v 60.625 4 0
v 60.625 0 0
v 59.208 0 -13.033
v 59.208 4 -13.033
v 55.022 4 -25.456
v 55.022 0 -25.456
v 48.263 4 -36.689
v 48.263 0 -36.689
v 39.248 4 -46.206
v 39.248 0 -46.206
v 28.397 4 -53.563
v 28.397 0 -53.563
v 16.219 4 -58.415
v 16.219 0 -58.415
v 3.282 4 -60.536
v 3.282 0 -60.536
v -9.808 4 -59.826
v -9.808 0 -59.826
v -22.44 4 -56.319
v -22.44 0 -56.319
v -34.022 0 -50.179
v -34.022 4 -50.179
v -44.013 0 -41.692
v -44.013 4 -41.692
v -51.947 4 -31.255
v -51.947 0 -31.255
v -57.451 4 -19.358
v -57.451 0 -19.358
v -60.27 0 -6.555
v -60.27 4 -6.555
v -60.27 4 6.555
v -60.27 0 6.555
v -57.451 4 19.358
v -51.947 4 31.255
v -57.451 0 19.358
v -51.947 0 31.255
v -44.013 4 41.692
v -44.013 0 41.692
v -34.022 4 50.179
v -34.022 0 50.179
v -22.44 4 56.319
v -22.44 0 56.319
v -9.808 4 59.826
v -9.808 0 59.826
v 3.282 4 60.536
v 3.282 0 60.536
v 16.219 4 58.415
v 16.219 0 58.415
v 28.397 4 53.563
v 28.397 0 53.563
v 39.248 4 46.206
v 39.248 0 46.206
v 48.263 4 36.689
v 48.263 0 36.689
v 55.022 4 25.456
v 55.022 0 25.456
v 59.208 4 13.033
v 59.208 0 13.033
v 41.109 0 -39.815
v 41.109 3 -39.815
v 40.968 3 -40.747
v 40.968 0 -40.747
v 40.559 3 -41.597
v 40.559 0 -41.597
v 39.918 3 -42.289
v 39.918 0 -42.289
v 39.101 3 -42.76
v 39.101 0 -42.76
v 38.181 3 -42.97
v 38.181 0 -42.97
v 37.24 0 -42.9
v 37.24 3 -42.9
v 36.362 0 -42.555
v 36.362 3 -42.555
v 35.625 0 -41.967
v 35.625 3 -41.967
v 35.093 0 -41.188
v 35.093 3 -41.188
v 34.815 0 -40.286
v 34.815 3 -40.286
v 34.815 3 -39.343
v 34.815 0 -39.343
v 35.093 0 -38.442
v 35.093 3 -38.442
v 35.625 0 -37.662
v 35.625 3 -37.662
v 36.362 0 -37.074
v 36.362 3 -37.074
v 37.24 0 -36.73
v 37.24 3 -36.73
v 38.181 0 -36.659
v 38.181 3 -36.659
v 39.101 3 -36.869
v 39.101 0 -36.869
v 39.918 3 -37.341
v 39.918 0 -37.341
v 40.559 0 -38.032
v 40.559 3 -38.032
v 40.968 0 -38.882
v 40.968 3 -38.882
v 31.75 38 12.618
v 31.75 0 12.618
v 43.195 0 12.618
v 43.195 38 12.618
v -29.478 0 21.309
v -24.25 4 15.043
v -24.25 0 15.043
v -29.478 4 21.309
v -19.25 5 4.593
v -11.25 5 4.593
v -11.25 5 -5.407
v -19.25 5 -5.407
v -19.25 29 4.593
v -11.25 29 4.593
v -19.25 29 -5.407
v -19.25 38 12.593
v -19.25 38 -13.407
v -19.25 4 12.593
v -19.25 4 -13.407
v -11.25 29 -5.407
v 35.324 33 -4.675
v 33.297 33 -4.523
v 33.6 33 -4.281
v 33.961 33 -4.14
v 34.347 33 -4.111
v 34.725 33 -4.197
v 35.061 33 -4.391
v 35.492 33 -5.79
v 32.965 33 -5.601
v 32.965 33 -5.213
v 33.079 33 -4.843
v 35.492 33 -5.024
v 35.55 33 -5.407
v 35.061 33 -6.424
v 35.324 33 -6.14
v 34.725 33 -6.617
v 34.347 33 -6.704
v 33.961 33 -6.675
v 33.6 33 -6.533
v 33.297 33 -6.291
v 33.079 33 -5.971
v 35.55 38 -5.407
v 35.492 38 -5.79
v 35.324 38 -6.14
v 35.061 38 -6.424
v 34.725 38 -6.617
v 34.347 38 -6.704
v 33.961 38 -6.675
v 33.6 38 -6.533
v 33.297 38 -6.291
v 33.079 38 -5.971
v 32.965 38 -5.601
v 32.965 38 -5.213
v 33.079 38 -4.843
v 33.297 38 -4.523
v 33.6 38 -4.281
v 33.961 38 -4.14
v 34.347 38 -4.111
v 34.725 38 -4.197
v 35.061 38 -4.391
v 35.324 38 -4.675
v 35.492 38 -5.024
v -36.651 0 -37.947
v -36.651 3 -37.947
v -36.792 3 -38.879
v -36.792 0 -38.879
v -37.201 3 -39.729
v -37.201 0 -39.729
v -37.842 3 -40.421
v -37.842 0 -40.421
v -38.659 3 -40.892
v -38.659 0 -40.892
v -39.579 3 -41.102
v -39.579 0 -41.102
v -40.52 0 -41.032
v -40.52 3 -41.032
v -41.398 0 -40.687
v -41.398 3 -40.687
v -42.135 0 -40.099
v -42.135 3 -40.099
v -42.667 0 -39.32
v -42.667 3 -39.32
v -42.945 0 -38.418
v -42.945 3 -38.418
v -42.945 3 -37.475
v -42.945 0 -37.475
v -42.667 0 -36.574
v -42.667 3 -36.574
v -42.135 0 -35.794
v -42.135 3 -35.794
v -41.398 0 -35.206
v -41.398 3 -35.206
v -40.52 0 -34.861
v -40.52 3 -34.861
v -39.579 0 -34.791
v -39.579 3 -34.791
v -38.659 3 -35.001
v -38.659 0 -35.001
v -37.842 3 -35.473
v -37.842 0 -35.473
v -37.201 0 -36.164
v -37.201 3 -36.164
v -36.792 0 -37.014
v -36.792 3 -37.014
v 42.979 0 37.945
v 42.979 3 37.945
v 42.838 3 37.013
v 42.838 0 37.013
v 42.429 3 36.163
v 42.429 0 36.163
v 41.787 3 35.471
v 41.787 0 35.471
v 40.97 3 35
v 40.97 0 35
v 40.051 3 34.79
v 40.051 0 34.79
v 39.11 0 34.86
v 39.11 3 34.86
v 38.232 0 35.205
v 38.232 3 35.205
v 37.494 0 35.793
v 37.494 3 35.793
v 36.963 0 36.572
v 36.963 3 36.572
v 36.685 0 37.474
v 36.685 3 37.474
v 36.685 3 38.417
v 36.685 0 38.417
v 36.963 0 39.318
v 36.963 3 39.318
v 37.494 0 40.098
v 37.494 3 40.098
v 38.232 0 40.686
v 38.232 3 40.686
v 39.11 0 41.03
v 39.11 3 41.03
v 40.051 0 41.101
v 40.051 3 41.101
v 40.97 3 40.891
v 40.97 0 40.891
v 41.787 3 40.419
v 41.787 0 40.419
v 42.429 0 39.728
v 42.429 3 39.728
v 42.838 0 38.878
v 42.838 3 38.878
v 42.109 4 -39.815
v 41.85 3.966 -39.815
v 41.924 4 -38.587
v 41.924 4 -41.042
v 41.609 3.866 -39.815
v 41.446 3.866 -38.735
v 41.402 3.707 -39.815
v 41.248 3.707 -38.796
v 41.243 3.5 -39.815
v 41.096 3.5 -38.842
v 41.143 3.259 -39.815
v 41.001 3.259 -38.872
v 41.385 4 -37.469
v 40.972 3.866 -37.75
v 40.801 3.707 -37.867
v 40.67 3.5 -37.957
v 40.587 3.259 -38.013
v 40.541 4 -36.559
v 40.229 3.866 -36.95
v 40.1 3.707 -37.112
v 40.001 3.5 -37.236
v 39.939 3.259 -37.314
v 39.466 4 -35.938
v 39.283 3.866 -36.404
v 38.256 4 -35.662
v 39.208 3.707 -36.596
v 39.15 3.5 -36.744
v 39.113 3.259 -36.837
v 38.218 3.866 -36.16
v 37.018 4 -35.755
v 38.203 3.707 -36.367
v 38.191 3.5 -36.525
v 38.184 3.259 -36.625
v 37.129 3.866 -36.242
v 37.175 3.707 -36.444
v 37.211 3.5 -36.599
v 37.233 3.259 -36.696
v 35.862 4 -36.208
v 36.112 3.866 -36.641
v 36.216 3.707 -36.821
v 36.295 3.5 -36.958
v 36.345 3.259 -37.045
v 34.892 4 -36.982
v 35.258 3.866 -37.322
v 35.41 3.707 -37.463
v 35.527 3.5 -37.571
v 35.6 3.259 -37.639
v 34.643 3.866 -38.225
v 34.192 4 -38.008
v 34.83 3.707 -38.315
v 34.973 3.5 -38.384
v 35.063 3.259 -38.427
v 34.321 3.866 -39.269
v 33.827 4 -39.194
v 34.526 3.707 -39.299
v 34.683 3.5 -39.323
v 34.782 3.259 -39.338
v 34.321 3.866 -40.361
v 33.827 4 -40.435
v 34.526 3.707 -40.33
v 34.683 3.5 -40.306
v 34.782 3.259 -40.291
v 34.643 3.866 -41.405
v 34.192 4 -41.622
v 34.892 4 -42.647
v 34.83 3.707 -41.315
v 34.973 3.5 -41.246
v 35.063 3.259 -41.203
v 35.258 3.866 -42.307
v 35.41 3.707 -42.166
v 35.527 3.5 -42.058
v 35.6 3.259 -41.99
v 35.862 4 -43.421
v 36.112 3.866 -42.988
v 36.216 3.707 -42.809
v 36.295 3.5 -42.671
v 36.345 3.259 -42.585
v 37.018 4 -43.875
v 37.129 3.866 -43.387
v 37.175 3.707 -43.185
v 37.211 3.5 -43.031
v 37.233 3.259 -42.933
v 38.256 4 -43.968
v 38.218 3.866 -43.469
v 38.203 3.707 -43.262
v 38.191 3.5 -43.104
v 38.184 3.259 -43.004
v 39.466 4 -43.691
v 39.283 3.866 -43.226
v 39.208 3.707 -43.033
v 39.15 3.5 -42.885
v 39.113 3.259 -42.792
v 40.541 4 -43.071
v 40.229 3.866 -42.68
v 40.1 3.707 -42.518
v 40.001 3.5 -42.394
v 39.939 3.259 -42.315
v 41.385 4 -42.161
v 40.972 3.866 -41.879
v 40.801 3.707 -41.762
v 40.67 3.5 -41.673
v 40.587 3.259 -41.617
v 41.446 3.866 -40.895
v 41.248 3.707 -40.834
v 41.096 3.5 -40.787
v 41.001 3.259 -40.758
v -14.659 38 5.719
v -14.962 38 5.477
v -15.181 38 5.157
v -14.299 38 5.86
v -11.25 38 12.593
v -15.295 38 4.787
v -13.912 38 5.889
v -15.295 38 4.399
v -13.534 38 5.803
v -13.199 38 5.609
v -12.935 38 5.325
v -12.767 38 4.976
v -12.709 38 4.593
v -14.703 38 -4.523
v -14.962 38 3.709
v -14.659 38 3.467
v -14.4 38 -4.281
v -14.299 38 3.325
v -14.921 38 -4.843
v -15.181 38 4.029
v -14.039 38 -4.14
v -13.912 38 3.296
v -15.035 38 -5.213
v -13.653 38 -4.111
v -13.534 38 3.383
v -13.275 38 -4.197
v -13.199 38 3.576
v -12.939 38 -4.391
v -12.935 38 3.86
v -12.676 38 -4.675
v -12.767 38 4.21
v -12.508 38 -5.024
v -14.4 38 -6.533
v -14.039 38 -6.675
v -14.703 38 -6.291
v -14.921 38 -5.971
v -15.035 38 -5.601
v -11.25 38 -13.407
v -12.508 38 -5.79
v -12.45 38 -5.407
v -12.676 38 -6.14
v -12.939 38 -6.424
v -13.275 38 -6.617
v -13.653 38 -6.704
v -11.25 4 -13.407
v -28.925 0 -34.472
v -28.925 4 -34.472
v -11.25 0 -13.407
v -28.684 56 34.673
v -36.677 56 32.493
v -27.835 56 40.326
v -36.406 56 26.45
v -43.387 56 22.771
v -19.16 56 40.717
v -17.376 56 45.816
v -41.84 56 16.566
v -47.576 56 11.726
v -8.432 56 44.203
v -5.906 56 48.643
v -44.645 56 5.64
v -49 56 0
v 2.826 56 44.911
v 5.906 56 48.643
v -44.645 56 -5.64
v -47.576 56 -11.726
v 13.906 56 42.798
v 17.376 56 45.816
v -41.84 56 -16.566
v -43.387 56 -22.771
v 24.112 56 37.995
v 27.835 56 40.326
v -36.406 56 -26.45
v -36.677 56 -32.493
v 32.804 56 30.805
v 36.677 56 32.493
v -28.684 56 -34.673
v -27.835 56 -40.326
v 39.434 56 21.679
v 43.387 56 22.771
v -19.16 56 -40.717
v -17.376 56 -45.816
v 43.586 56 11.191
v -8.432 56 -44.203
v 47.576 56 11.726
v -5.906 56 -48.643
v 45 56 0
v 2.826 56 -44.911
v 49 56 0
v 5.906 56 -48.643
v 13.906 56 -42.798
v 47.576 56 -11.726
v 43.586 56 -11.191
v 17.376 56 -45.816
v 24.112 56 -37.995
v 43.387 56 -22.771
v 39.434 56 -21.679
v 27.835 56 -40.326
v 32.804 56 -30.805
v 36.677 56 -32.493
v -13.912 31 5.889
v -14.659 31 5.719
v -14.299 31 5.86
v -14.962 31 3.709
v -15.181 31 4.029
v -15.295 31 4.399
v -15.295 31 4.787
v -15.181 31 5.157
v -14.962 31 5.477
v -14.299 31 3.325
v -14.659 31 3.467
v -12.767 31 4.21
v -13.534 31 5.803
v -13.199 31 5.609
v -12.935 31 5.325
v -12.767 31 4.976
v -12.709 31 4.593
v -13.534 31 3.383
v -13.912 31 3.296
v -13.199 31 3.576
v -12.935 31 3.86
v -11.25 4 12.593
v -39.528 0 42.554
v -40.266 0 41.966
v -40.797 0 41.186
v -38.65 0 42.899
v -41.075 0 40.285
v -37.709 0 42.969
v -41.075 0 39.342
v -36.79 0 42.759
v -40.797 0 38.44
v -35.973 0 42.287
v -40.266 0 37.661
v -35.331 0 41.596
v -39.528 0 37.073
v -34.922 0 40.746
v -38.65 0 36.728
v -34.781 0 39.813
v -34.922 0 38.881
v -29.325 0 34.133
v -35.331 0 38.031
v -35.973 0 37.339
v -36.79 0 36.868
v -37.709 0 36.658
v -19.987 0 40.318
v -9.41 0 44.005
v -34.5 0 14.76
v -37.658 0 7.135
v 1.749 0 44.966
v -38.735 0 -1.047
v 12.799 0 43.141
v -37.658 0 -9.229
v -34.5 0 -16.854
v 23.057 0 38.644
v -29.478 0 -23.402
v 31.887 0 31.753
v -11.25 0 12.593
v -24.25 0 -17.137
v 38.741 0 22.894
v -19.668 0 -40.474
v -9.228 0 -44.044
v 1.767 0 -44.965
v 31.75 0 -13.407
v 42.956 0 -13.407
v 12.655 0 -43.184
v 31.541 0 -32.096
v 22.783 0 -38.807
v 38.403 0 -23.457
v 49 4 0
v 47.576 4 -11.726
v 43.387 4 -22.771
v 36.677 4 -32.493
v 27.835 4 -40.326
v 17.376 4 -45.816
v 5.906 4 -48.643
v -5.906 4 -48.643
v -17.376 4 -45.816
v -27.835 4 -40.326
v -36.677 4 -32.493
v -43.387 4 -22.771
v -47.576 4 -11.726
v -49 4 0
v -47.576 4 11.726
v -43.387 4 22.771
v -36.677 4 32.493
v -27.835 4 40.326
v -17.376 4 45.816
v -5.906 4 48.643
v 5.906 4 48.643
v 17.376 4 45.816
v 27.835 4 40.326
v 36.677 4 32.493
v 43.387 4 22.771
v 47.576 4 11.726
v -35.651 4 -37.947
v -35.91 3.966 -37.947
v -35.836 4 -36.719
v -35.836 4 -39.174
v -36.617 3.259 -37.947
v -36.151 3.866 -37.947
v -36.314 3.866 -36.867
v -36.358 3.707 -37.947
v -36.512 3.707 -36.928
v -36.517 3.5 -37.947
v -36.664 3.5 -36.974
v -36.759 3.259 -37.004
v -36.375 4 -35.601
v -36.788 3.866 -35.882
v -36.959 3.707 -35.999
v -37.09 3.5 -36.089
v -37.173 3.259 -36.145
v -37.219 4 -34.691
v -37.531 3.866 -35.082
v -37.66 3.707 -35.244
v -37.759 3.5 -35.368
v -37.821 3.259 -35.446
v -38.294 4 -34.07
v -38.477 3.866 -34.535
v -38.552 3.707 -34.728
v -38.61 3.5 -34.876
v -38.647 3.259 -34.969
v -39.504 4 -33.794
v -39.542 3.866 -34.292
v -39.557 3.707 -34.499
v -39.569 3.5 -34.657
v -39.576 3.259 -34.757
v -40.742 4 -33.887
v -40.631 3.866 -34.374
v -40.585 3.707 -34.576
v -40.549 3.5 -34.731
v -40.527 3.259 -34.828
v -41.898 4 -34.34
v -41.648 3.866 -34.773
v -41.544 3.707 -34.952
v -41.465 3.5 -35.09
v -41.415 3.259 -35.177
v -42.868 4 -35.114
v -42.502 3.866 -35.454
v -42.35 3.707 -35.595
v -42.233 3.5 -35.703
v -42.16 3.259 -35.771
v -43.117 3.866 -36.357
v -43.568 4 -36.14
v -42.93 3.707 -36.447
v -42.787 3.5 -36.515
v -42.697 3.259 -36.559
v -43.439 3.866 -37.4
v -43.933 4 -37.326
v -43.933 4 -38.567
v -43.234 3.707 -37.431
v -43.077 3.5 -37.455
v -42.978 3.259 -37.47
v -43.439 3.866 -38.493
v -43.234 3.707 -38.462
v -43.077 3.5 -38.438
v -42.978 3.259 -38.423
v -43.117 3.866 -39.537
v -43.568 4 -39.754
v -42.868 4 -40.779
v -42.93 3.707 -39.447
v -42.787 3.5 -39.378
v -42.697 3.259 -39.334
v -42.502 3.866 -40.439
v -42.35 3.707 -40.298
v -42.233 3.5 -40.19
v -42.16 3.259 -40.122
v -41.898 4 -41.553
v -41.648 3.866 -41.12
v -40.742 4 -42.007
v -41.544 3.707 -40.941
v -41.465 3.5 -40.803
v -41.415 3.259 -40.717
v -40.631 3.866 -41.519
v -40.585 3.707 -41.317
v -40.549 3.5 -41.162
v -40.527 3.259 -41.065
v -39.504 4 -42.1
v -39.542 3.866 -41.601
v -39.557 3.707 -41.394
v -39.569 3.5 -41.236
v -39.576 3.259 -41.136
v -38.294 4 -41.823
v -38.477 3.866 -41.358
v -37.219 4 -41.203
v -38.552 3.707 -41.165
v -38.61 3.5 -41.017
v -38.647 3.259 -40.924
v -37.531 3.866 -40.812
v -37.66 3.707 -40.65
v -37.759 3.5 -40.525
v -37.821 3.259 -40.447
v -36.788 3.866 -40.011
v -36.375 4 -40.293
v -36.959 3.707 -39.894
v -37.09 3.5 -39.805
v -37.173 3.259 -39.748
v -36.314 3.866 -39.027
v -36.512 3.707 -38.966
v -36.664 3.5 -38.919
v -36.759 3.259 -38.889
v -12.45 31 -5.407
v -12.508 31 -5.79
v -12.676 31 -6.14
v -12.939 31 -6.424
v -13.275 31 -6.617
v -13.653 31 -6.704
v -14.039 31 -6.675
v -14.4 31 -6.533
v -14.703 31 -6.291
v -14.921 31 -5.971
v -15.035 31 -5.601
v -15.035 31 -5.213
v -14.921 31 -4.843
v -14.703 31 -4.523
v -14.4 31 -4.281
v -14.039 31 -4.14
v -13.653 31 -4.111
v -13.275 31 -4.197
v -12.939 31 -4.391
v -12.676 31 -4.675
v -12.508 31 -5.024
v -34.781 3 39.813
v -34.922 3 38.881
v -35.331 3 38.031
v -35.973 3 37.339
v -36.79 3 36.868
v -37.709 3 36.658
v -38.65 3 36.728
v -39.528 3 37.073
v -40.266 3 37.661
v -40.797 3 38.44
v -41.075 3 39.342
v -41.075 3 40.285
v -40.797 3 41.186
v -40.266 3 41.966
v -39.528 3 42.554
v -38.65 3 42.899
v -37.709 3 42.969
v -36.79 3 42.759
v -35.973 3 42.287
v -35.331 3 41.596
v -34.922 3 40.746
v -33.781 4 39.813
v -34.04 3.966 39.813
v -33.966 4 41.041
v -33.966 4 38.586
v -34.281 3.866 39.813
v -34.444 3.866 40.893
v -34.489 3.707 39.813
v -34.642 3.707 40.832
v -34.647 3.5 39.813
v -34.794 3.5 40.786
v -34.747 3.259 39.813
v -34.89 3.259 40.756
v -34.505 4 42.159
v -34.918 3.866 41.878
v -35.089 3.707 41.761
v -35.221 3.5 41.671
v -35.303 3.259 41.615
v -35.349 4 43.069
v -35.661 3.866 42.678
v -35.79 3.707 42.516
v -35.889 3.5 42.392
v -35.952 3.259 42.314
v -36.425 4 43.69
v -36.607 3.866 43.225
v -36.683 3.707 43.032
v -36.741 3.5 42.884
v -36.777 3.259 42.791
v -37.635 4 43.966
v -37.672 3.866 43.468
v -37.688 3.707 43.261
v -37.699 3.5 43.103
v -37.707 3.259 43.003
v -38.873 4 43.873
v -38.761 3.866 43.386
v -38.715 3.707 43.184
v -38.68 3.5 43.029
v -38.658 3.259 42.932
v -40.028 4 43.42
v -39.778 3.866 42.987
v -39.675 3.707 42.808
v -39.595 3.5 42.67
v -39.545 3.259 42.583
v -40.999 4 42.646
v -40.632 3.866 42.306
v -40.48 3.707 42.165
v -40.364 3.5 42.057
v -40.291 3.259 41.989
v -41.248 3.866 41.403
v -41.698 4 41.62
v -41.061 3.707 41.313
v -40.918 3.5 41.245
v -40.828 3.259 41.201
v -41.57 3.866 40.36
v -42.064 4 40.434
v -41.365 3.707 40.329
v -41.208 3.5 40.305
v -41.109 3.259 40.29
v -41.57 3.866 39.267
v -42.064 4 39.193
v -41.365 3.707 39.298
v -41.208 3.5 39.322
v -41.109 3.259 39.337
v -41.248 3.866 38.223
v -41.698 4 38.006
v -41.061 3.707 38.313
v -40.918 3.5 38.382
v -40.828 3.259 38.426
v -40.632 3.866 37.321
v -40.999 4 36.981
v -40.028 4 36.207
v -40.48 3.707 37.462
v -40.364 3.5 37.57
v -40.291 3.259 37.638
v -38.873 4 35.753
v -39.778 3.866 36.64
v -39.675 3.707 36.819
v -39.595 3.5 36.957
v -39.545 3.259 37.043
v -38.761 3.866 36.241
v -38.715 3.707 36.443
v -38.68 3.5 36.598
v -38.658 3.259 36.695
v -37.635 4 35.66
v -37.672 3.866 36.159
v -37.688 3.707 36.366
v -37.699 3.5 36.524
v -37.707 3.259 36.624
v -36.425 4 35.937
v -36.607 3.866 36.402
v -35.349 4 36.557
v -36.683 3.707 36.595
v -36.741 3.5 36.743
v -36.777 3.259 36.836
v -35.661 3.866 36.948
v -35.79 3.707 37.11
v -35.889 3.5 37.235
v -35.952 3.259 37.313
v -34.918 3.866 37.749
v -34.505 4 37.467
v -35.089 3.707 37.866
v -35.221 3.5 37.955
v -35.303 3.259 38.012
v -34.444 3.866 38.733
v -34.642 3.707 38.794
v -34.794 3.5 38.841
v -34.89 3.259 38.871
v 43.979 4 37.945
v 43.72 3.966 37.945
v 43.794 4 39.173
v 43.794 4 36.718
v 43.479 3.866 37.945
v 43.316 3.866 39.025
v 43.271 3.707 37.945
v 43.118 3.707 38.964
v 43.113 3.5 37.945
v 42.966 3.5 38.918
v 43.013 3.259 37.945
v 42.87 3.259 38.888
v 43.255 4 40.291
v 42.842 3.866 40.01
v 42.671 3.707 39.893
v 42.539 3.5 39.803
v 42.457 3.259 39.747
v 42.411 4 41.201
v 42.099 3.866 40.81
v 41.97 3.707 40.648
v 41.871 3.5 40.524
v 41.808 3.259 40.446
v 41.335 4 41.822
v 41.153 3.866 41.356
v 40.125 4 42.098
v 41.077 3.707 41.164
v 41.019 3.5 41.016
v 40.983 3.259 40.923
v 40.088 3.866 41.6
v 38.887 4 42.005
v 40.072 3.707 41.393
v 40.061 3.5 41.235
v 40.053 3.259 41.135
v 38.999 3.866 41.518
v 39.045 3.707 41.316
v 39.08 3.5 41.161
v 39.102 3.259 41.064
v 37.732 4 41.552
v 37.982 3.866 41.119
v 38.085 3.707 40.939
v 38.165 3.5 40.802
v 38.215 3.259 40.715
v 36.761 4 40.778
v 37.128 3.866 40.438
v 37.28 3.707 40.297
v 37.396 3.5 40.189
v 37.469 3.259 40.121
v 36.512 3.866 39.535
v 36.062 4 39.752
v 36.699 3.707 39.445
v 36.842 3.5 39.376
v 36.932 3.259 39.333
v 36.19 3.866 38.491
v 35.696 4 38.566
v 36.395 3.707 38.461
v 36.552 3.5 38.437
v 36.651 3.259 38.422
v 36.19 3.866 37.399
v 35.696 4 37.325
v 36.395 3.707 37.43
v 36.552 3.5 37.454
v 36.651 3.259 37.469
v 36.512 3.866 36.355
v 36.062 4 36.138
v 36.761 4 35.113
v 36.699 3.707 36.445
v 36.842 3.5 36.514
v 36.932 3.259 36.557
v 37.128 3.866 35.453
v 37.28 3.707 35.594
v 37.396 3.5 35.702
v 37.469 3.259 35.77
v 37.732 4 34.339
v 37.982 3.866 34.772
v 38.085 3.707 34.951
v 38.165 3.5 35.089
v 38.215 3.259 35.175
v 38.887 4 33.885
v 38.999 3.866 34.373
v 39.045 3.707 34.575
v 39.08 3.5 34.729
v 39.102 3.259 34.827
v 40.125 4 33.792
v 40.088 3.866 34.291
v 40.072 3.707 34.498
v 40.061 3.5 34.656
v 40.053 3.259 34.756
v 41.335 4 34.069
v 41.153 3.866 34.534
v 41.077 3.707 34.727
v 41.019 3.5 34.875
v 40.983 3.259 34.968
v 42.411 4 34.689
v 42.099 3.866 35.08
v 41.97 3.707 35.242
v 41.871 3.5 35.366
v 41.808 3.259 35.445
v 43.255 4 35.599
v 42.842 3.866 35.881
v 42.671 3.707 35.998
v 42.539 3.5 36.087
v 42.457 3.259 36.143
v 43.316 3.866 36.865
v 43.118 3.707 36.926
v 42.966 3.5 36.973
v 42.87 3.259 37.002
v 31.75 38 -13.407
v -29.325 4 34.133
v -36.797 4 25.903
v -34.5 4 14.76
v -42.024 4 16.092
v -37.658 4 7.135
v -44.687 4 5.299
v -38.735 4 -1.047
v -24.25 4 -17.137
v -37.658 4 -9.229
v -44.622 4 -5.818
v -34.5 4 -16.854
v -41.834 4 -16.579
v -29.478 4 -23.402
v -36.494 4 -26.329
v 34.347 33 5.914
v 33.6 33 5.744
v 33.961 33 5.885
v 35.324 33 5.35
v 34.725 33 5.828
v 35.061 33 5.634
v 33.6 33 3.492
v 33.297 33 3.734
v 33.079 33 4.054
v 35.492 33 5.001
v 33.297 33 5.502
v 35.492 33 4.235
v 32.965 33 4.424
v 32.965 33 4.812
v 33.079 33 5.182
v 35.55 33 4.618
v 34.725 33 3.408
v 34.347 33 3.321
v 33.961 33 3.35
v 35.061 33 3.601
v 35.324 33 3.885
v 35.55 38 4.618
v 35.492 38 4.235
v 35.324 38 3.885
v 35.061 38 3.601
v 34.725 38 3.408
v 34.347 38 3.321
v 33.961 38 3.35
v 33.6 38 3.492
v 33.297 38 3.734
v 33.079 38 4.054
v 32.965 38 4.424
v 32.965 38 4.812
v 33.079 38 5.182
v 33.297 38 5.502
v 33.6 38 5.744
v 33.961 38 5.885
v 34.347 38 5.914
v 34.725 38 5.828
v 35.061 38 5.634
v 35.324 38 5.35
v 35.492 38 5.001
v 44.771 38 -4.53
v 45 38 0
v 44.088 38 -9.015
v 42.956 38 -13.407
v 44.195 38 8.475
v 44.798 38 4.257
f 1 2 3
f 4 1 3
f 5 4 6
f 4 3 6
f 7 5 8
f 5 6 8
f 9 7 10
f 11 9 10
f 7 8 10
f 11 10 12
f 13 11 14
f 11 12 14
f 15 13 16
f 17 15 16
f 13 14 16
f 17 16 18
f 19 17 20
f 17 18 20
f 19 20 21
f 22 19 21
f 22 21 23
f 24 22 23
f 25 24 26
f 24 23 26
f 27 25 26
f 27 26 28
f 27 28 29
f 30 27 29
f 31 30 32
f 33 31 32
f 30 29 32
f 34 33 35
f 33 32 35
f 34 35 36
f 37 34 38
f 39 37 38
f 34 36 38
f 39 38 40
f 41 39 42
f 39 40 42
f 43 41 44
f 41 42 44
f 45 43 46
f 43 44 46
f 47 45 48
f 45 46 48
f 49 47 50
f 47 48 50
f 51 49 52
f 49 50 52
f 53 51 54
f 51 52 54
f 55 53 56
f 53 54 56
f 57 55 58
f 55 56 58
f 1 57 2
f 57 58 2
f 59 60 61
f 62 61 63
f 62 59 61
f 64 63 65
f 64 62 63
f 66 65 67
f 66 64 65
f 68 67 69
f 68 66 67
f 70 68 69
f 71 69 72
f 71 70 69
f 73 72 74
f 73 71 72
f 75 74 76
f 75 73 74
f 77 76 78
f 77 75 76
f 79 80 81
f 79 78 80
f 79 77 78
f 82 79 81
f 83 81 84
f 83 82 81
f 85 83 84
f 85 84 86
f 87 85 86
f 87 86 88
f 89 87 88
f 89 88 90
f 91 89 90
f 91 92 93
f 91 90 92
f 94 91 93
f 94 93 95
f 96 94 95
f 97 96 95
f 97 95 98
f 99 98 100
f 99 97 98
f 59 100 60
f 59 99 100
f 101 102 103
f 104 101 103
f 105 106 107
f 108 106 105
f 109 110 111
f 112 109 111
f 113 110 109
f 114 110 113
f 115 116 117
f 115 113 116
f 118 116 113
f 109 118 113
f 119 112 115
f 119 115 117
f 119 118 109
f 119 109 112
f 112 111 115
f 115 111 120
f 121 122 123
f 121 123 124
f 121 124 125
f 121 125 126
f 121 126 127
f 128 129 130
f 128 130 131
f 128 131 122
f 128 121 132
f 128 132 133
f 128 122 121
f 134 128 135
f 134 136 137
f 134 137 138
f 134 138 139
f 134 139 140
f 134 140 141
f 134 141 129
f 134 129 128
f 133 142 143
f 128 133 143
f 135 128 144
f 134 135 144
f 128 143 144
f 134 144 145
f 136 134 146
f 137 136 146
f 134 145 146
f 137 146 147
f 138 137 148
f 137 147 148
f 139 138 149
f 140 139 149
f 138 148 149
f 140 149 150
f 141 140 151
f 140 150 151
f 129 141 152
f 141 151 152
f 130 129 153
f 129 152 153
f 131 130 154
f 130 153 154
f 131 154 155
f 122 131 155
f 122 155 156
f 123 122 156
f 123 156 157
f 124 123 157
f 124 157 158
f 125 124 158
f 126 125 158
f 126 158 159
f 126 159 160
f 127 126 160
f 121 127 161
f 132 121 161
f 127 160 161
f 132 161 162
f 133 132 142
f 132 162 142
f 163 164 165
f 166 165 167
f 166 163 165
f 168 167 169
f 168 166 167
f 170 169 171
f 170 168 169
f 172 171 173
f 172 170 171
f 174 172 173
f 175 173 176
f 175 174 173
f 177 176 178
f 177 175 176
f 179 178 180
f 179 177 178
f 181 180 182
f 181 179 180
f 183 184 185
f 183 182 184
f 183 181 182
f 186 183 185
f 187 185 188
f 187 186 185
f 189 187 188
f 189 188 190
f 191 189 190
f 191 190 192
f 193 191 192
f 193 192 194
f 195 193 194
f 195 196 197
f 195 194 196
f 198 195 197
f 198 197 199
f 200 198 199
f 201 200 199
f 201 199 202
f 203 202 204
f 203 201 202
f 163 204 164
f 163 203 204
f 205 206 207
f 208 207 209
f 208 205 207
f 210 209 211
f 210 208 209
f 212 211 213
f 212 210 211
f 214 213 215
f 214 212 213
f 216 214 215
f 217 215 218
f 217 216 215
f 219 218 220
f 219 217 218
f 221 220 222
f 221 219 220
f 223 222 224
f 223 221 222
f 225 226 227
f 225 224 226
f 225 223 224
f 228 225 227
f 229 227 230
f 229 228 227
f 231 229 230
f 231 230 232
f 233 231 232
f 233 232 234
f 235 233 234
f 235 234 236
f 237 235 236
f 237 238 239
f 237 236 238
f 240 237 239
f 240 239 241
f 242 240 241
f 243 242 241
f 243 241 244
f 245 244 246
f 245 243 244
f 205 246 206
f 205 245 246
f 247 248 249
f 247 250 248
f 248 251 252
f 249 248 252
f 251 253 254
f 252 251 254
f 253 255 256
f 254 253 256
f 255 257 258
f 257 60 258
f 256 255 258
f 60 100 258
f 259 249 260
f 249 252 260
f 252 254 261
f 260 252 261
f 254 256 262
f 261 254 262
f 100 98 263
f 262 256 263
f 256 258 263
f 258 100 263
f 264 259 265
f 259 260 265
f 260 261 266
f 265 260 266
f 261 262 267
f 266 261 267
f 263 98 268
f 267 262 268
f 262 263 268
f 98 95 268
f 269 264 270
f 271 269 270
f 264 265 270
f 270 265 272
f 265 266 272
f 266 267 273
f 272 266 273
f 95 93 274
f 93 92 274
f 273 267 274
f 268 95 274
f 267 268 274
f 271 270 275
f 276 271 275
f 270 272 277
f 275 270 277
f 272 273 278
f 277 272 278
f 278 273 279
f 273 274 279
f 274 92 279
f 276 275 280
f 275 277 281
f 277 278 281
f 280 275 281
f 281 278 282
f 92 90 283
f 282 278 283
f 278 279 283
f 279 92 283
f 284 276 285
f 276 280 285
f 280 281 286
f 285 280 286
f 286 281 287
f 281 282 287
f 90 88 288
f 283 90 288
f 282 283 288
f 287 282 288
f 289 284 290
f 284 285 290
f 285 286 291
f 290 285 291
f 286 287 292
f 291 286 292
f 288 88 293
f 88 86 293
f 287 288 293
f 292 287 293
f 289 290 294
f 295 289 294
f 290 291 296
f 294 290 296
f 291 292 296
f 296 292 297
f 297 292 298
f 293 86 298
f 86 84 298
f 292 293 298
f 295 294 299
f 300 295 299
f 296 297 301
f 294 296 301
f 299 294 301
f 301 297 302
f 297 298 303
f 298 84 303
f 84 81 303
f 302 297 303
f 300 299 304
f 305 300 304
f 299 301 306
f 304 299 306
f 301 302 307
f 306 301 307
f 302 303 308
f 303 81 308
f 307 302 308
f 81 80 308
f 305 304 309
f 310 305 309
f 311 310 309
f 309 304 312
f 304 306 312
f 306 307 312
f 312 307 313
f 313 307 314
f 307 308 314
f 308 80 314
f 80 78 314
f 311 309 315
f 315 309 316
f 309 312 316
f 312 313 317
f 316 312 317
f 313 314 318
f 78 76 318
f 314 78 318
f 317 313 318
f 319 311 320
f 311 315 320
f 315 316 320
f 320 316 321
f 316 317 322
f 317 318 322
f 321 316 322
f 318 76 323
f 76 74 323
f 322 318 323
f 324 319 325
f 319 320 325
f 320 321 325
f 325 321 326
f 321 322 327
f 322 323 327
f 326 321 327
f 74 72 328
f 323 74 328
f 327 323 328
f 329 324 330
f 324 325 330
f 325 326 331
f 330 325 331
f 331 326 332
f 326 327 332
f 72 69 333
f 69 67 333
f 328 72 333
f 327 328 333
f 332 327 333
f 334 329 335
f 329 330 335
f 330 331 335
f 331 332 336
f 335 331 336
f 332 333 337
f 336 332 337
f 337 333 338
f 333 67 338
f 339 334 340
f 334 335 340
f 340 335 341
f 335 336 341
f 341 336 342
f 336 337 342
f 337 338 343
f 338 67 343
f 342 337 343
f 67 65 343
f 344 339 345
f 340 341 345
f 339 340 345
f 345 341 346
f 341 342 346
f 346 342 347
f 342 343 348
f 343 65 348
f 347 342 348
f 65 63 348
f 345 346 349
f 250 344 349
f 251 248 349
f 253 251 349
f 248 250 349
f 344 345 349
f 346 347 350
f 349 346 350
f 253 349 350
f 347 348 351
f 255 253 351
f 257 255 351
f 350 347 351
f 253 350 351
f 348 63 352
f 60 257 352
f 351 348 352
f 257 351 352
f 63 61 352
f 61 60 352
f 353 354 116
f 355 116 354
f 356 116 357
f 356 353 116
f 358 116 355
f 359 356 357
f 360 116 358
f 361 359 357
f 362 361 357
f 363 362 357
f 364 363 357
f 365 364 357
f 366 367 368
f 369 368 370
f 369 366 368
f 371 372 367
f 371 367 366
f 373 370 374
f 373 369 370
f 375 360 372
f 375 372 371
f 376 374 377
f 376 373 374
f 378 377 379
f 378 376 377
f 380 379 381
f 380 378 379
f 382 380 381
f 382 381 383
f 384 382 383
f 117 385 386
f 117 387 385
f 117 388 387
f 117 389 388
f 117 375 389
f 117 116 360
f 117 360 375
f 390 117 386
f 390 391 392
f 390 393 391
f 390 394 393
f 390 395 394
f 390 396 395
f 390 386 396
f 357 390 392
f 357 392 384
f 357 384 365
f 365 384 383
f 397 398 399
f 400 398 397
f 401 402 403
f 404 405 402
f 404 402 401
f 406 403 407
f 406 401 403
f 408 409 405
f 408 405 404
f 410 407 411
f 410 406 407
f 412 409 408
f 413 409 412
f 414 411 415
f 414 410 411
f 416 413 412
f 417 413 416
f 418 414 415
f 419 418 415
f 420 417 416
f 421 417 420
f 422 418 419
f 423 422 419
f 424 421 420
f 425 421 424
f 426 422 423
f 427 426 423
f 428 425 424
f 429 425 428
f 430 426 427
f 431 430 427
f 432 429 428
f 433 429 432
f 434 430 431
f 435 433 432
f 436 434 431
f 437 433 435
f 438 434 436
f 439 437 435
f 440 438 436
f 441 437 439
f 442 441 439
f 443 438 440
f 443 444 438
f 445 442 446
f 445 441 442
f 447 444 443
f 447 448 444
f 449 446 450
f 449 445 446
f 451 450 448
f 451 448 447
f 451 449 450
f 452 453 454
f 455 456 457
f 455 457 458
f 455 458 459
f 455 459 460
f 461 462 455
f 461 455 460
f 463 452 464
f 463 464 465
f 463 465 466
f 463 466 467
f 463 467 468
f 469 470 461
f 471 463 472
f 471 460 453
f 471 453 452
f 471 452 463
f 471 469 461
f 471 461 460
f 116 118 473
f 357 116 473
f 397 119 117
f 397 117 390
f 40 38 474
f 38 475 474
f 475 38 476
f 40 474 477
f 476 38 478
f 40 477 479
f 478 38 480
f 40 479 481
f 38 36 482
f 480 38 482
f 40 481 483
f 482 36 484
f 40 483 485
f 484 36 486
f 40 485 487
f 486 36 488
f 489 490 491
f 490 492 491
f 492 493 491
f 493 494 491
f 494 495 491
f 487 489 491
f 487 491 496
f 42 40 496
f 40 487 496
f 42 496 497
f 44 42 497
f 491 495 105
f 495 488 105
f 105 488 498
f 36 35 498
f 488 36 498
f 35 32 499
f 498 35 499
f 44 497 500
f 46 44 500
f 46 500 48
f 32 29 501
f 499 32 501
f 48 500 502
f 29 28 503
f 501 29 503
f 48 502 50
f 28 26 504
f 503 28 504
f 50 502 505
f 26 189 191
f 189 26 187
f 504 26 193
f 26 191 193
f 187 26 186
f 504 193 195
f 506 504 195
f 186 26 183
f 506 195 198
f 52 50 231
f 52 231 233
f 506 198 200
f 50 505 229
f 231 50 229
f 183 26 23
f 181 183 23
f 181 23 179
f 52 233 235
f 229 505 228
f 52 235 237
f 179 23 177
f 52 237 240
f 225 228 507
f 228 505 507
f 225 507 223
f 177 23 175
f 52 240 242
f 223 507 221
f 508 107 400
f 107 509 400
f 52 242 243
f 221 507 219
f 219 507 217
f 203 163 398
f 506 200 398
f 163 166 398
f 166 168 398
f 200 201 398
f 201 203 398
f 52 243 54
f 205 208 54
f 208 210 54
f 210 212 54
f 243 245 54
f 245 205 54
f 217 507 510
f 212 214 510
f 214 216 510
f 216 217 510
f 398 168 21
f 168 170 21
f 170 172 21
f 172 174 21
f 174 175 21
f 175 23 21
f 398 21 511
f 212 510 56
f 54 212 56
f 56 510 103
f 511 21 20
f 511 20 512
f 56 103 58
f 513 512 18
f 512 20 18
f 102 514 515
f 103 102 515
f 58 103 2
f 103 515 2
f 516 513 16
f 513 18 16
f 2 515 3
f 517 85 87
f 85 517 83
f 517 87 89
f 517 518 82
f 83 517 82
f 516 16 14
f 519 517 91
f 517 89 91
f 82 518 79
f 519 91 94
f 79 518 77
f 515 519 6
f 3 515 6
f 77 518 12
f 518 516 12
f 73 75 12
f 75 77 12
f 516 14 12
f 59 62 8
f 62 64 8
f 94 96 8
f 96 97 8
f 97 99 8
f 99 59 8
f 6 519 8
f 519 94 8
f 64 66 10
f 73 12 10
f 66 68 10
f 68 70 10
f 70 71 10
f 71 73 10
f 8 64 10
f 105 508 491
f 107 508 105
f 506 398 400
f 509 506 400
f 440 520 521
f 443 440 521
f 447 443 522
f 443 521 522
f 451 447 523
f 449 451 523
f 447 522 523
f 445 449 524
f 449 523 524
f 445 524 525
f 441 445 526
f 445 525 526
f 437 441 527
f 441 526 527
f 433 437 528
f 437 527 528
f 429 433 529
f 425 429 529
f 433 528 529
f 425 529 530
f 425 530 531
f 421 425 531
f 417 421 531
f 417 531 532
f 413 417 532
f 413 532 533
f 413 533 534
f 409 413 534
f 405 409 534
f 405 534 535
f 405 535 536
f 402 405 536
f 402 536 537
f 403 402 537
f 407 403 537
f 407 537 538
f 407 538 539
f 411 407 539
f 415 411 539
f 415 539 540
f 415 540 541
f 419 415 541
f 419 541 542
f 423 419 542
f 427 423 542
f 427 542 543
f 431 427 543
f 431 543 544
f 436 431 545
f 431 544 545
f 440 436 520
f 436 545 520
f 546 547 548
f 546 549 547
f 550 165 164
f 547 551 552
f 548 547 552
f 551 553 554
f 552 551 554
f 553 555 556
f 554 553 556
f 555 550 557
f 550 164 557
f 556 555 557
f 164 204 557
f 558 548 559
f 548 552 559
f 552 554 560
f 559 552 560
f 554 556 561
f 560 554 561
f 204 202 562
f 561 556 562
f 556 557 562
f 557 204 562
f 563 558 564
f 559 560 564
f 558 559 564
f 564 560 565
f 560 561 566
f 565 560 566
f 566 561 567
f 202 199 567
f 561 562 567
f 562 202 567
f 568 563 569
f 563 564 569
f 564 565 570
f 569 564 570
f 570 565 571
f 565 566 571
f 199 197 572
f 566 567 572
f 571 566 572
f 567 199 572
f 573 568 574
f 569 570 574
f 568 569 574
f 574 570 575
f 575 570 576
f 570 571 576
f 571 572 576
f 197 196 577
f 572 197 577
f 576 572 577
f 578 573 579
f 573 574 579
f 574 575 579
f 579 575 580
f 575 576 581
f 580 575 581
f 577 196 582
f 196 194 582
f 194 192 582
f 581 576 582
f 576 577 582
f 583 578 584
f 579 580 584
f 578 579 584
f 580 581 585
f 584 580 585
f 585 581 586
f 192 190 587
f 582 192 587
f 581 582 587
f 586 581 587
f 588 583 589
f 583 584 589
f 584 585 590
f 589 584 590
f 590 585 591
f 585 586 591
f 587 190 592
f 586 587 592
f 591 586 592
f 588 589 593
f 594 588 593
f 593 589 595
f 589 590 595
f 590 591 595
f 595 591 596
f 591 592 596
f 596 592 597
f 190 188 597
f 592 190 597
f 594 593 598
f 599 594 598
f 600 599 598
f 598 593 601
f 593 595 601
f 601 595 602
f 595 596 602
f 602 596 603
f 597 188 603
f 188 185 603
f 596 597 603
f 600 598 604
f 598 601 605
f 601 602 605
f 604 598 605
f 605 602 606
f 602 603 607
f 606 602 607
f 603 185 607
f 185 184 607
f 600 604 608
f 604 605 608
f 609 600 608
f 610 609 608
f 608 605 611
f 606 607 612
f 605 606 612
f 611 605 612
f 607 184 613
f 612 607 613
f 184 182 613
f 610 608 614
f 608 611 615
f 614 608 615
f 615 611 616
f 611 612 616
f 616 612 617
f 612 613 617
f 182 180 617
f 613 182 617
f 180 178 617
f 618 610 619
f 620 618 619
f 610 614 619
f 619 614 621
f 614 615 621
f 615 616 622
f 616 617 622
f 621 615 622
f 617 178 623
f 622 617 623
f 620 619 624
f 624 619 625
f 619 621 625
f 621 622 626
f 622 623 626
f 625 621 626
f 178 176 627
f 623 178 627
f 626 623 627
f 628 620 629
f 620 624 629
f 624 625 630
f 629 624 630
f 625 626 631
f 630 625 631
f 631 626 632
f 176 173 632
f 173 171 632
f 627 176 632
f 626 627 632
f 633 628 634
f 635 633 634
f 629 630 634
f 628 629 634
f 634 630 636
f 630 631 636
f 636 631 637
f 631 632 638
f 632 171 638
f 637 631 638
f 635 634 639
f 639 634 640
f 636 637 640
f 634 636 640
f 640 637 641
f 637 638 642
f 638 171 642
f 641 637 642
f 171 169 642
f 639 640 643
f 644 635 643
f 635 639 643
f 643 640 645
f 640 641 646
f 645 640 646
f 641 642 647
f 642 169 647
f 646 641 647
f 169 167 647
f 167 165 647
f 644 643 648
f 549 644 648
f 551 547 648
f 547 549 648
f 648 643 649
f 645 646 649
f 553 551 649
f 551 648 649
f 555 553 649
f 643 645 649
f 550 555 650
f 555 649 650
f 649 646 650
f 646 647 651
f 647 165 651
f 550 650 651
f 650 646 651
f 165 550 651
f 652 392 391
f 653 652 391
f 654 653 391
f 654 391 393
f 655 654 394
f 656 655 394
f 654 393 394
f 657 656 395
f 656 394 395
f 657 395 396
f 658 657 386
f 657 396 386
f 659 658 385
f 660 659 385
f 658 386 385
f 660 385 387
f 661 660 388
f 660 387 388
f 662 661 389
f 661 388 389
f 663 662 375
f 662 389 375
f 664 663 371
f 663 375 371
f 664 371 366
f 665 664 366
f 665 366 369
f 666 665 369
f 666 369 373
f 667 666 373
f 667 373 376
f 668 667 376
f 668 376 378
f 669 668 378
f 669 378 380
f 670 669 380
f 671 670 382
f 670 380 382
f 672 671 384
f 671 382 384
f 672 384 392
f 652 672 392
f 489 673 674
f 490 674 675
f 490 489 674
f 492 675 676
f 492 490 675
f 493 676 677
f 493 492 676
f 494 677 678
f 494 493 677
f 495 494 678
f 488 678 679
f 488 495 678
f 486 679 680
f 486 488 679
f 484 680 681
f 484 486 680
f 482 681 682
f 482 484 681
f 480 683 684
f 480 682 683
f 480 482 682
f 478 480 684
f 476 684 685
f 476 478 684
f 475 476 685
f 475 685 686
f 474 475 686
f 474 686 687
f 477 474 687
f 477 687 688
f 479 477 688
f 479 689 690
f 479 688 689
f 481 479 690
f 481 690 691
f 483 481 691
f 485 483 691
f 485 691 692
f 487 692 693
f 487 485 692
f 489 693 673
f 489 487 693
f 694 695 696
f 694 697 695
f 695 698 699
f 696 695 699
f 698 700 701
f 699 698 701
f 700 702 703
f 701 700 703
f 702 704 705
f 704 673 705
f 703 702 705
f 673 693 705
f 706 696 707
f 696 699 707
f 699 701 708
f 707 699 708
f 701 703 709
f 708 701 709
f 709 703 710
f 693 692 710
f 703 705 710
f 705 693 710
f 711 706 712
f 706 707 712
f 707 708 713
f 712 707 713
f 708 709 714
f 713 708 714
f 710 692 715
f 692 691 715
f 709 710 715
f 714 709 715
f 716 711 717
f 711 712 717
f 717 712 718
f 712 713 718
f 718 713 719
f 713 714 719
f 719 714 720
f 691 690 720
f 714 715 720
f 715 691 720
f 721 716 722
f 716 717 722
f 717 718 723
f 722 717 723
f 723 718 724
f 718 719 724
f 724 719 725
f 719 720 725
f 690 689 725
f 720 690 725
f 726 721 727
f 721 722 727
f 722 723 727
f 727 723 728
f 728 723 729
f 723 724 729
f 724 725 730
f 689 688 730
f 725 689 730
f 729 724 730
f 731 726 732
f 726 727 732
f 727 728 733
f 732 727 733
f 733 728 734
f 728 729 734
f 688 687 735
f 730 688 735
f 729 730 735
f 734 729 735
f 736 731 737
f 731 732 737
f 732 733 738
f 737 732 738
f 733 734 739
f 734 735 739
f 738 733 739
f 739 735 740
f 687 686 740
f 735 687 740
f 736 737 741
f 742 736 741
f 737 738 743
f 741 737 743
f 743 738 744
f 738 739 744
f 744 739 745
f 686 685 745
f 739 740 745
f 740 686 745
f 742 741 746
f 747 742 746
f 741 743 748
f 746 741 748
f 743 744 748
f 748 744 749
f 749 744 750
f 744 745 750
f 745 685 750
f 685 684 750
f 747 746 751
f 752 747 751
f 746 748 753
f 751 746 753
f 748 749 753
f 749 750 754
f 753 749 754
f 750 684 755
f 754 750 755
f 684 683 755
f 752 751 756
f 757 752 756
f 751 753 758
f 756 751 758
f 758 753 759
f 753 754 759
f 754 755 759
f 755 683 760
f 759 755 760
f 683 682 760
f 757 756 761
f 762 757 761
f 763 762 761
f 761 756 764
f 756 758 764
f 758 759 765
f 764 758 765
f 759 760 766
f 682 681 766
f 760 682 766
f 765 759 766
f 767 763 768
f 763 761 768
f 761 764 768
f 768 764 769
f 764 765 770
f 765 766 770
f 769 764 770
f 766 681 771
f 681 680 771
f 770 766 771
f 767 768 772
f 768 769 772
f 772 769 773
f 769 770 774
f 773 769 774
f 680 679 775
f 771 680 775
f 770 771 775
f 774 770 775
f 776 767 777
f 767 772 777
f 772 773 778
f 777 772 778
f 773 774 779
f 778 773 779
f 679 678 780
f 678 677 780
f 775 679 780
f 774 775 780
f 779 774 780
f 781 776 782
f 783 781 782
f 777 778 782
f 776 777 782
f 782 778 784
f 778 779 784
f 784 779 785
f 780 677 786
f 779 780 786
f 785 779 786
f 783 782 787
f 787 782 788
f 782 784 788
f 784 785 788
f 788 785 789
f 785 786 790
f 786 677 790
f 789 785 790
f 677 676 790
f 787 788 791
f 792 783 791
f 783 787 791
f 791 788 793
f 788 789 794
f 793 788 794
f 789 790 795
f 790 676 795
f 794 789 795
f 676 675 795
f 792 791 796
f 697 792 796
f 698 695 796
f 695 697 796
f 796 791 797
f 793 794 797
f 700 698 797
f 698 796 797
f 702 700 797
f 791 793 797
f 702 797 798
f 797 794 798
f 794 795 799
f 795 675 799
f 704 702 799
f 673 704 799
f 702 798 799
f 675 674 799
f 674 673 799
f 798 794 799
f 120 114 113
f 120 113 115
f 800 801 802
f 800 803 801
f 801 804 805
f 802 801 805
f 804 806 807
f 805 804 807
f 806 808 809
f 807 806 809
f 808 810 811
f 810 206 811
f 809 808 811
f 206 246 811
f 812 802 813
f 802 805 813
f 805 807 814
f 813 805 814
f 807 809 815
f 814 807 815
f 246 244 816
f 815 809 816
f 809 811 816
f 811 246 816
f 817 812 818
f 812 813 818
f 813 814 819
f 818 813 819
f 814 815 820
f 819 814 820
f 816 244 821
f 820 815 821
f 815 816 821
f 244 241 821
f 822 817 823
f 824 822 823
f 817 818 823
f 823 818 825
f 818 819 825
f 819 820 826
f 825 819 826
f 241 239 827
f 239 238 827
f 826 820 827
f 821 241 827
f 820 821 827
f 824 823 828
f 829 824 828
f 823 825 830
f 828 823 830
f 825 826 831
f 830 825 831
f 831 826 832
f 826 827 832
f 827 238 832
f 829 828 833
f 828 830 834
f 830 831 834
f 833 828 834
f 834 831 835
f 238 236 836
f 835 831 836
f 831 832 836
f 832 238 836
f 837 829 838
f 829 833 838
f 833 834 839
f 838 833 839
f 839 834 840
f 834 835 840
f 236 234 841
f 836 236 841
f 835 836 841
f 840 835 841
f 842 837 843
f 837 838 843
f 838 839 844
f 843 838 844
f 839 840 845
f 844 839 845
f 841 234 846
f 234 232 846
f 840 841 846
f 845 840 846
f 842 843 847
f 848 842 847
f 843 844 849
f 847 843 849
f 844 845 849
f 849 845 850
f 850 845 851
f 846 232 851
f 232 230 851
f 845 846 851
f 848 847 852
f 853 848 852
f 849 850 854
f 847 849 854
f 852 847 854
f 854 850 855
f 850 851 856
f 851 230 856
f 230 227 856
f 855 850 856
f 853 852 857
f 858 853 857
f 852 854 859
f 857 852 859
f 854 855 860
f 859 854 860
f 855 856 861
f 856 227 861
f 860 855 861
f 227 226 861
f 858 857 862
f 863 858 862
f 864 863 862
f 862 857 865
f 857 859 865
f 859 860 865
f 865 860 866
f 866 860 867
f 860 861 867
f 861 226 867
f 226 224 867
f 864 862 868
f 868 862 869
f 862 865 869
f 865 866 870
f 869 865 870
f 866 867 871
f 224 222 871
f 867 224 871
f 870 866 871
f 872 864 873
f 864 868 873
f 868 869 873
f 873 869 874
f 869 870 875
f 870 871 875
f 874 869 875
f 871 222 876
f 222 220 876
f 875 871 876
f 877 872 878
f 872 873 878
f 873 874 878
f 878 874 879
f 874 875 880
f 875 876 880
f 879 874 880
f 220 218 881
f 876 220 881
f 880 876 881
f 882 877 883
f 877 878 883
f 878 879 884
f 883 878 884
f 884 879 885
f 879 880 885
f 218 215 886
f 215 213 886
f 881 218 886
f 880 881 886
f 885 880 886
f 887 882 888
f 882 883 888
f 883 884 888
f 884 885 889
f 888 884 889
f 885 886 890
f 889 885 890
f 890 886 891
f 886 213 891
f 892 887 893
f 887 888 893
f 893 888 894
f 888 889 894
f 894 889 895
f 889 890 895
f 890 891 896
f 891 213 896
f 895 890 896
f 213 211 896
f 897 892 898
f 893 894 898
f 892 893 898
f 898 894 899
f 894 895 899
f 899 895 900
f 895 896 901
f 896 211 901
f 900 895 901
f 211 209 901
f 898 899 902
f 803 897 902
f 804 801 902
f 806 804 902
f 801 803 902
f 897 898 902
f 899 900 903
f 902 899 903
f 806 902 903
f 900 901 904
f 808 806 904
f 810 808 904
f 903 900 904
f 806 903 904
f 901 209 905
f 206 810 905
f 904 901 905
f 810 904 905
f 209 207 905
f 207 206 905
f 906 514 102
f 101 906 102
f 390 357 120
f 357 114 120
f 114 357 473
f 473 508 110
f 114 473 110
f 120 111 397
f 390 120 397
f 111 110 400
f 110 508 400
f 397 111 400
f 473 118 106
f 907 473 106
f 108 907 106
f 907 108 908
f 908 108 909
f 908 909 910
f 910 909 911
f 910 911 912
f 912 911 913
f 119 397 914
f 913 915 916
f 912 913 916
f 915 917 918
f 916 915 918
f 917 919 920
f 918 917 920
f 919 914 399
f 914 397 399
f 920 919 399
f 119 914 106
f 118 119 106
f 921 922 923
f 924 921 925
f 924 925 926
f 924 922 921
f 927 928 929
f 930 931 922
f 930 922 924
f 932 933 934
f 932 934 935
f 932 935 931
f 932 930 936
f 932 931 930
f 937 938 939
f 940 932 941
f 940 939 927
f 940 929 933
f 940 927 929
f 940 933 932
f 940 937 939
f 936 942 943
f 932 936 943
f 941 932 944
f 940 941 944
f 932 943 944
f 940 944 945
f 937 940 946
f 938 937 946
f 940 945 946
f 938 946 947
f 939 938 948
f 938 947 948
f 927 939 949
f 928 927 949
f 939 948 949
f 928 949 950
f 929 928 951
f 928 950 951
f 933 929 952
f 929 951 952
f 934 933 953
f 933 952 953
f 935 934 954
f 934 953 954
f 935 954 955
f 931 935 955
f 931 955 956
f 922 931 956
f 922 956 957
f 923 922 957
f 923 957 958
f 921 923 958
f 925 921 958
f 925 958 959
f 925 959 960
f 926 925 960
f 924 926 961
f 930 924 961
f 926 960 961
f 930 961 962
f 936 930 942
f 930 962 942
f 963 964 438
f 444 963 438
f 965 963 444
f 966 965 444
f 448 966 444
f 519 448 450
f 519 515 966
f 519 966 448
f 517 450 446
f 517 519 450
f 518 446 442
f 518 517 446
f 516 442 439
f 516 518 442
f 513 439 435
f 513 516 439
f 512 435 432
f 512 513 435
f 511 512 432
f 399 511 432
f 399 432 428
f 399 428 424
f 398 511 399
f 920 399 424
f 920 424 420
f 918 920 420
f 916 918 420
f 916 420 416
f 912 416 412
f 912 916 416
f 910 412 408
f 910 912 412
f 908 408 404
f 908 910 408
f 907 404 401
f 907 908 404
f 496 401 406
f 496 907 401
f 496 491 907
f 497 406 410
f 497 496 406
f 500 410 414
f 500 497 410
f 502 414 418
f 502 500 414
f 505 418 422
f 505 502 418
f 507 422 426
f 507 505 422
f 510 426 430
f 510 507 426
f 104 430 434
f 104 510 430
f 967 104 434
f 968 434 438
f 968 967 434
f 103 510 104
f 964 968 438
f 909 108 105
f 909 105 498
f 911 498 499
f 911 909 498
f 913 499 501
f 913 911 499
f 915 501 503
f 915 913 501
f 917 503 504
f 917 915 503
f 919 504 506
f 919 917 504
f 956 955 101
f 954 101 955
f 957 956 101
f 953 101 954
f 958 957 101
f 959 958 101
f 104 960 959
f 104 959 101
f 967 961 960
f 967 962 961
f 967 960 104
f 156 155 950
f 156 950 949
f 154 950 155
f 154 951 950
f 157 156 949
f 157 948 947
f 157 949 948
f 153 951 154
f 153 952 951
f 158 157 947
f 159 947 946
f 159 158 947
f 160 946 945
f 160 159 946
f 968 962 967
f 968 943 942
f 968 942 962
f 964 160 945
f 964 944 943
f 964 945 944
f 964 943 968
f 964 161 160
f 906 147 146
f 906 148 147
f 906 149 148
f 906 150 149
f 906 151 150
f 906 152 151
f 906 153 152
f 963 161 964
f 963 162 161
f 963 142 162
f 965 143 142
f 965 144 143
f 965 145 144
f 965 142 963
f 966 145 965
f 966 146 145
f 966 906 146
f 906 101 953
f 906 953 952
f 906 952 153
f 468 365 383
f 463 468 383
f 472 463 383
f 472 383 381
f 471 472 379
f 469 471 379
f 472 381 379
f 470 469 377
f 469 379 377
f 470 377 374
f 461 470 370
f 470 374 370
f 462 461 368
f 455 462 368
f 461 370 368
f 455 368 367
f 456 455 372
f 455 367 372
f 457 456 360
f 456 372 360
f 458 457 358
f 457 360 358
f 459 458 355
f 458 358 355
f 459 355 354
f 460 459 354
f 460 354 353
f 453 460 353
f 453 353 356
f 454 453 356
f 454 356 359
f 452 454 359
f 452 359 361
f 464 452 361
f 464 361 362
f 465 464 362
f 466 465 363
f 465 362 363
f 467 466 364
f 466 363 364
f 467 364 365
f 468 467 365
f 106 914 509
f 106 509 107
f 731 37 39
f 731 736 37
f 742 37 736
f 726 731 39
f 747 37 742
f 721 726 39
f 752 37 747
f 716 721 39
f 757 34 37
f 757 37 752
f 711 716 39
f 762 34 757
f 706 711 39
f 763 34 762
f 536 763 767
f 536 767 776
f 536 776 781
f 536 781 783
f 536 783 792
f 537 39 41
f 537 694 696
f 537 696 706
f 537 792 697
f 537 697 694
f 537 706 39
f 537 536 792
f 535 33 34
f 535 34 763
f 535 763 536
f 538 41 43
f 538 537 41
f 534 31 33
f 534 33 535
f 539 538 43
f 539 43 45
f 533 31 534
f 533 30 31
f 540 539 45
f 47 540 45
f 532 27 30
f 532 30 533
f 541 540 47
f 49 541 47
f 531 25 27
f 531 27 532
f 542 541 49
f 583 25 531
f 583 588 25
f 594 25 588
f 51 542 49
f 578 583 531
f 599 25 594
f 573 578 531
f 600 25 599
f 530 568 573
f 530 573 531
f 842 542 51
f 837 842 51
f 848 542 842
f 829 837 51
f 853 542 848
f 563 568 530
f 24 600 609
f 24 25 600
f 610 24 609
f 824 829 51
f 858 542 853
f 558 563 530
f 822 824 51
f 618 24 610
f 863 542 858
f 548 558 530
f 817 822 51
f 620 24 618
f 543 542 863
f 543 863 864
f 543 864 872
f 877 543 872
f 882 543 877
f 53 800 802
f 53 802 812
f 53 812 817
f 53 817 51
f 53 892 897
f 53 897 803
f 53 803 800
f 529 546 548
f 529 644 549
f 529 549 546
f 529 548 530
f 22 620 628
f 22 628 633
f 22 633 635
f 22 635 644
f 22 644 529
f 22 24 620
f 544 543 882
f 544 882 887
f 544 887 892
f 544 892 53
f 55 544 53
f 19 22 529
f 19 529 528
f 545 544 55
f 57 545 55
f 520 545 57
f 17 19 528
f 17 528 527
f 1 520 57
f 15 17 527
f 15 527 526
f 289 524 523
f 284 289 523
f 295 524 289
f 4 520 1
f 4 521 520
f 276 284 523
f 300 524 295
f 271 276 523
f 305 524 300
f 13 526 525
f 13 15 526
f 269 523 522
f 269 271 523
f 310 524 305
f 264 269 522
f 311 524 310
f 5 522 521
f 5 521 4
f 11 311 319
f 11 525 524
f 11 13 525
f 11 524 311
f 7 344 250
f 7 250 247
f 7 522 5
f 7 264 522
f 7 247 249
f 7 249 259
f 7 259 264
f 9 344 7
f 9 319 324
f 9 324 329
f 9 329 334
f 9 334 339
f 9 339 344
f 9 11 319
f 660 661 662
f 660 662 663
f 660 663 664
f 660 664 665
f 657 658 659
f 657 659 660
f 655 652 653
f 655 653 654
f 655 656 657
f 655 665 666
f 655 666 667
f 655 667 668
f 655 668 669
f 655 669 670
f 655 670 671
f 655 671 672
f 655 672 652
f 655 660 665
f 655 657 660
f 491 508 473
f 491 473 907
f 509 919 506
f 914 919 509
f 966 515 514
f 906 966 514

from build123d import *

# Parameters (mm, degrees)
SALIENTE_EXTRUIR2_DEPTH = 4
CROQUIS4_W              = 8
CROQUIS4_H              = 26
SALIENTE_EXTRUIR4_DEPTH = 34
CORTAR_EXTRUIR1_REACH   = 35.75
CROQUIS5_W              = 10
CROQUIS5_H              = 24
CROQUIS6_R              = 1.3
CORTAR_EXTRUIR2_DEPTH   = 7
SALIENTE_EXTRUIR5_DEPTH = 38
CROQUIS10_R             = 49
CROQUIS10_R_2           = 45
SALIENTE_EXTRUIR6_DEPTH = 56
CORTAR_EXTRUIR3_DEPTH   = 38
CROQUIS12_R             = 60.625
CROQUIS12_R_2           = 49
SALIENTE_EXTRUIR8_DEPTH = 4
CROQUIS13_R             = 3.1645
CORTAR_EXTRUIR5_DEPTH   = 14
CROQUIS14_R             = 1.3
CORTAR_EXTRUIR6_DEPTH   = 5
REDONDEO1_R             = 1


with BuildPart() as part:
    # Croquis1 → Saliente-Extruir2 (new body)
    with BuildSketch(Plane(origin=(0, 0, 0), x_dir=(1, 0, 0), z_dir=(0, 1, 0))):
        with BuildLine():
            Line((-11.25, 13.407227917), (-11.25, -12.592772083))
            Line((-11.25, -12.592772083), (-29.32452611, -34.133153509))
            ThreePointArc((-29.32452611, -34.133153509), (-44.999238647, 0.261765488), (-28.925442436, 34.47199994))
            Line((-28.925442436, 34.47199994), (-11.25, 13.407227917))
        make_face()
    extrude(amount=SALIENTE_EXTRUIR2_DEPTH)

    # Croquis4 → Saliente-Extruir4 (add)
    with BuildSketch(Plane(origin=(0, 4, 0), x_dir=(1, 0, 0), z_dir=(0, 1, 0))):
        with Locations((-15.25, 0.407227917)):
            Rectangle(CROQUIS4_W, CROQUIS4_H)
    extrude(amount=SALIENTE_EXTRUIR4_DEPTH)

    # Croquis5 → Cortar-Extruir1 (cut, up to next)
    with BuildSketch(Plane(origin=(-11.25, 0, 0), x_dir=(0, 0, -1), z_dir=(1, 0, 0)), mode=Mode.PRIVATE) as cortar_extruir1_sk1:
        with Locations((0.407227917, 17)):
            Rectangle(CROQUIS5_W, CROQUIS5_H)
    cortar_extruir1_tool1 = extrude(cortar_extruir1_sk1.sketch, amount=-CORTAR_EXTRUIR1_REACH, mode=Mode.PRIVATE) & part.part
    add(cortar_extruir1_tool1.solids().sort_by_distance((-11.25, 17, -0.407228))[0], mode=Mode.SUBTRACT)

    # Croquis6 → Cortar-Extruir2 (cut)
    with BuildSketch(Plane(origin=(0, 38, 0), x_dir=(1, 0, 0), z_dir=(0, 1, 0))):
        with Locations((-13.75, 5.407227917)):
            Circle(CROQUIS6_R)
        with Locations((-14.009261416, -4.592772083)):
            Circle(CROQUIS6_R)
    extrude(amount=-CORTAR_EXTRUIR2_DEPTH, mode=Mode.SUBTRACT)



with BuildPart() as body_2:
    # Croquis8 → Saliente-Extruir5 (new body)
    with BuildSketch(Plane(origin=(0, 0, 0), x_dir=(1, 0, 0), z_dir=(0, 1, 0))):
        with BuildLine():
            Line((31.75, 13.407227917), (31.75, -12.617796762))
            Line((31.75, -12.617796762), (43.287959819, -12.617796762))
            ThreePointArc((43.287959819, -12.617796762), (45.08754045, 0.412257936), (43.05, 13.407227917))
            Line((43.05, 13.407227917), (31.75, 13.407227917))
        make_face()
    extrude(amount=SALIENTE_EXTRUIR5_DEPTH)


with BuildPart() as part_1:
    add(part.part)

    add(body_2.part)  # Saliente-Extruir6 merges body 2
    # Croquis10 → Saliente-Extruir6 (add)
    with BuildSketch(Plane(origin=(0, 0, 0), x_dir=(1, 0, 0), z_dir=(0, 1, 0))):
        Circle(CROQUIS10_R)
        Circle(CROQUIS10_R_2, mode=Mode.SUBTRACT)
    extrude(amount=SALIENTE_EXTRUIR6_DEPTH)

    # Croquis11 → Cortar-Extruir3 (cut)
    with BuildSketch(Plane(origin=(0, 4, 0), x_dir=(1, 0, 0), z_dir=(0, 1, 0))):
        with BuildLine():
            Line((-24.25, 17.136853161), (-24.25, -15.043146839))
            Line((-24.25, -15.043146839), (-29.477670597, -21.308692316))
            ThreePointArc((-29.477670597, -21.308692316), (-38.734718404, 1.046853161), (-29.477670597, 23.402398638))
            Line((-29.477670597, 23.402398638), (-24.25, 17.136853161))
        make_face()
    extrude(amount=-CORTAR_EXTRUIR3_DEPTH, mode=Mode.SUBTRACT)

    # Croquis12 → Saliente-Extruir8 (add)
    with BuildSketch(Plane(origin=(0, 0, 0), x_dir=(1, 0, 0), z_dir=(0, 1, 0))):
        Circle(CROQUIS12_R)
        Circle(CROQUIS12_R_2, mode=Mode.SUBTRACT)
    extrude(amount=SALIENTE_EXTRUIR8_DEPTH)

    # Croquis13 → Cortar-Extruir5 (cut)
    with BuildSketch(Plane(origin=(0, 0, 0), x_dir=(1, 0, 0), z_dir=(0, 1, 0))):
        with Locations((-39.815475686, 37.946645437)):
            Circle(CROQUIS13_R)
        with Locations((37.944524314, 39.81473439)):
            Circle(CROQUIS13_R)
        with Locations((39.814027902, -37.94526561)):
            Circle(CROQUIS13_R)
        with Locations((-37.945972098, -39.813354563)):
            Circle(CROQUIS13_R)
    extrude(amount=CORTAR_EXTRUIR5_DEPTH, mode=Mode.SUBTRACT)

    # Croquis14 → Cortar-Extruir6 (cut)
    with BuildSketch(Plane(origin=(0, 38, 0), x_dir=(1, 0, 0), z_dir=(0, 1, 0))):
        with Locations((34.25, 5.407227917)):
            Circle(CROQUIS14_R)
        with Locations((34.25, -4.617796762)):
            Circle(CROQUIS14_R)
    extrude(amount=-CORTAR_EXTRUIR6_DEPTH, mode=Mode.SUBTRACT)

    # Redondeo1
    redondeo1_edges = [part_1.edges().sort_by_distance(p)[0] for p in [
        (-41.110472098, 4, 39.813354563),
        (36.649527902, 4, 37.94526561),
        (34.780024314, 4, -39.81473439),
        (-42.979975686, 4, -37.946645437),
    ]]
    fillet(redondeo1_edges, radius=REDONDEO1_R)


solid = part_1.part
